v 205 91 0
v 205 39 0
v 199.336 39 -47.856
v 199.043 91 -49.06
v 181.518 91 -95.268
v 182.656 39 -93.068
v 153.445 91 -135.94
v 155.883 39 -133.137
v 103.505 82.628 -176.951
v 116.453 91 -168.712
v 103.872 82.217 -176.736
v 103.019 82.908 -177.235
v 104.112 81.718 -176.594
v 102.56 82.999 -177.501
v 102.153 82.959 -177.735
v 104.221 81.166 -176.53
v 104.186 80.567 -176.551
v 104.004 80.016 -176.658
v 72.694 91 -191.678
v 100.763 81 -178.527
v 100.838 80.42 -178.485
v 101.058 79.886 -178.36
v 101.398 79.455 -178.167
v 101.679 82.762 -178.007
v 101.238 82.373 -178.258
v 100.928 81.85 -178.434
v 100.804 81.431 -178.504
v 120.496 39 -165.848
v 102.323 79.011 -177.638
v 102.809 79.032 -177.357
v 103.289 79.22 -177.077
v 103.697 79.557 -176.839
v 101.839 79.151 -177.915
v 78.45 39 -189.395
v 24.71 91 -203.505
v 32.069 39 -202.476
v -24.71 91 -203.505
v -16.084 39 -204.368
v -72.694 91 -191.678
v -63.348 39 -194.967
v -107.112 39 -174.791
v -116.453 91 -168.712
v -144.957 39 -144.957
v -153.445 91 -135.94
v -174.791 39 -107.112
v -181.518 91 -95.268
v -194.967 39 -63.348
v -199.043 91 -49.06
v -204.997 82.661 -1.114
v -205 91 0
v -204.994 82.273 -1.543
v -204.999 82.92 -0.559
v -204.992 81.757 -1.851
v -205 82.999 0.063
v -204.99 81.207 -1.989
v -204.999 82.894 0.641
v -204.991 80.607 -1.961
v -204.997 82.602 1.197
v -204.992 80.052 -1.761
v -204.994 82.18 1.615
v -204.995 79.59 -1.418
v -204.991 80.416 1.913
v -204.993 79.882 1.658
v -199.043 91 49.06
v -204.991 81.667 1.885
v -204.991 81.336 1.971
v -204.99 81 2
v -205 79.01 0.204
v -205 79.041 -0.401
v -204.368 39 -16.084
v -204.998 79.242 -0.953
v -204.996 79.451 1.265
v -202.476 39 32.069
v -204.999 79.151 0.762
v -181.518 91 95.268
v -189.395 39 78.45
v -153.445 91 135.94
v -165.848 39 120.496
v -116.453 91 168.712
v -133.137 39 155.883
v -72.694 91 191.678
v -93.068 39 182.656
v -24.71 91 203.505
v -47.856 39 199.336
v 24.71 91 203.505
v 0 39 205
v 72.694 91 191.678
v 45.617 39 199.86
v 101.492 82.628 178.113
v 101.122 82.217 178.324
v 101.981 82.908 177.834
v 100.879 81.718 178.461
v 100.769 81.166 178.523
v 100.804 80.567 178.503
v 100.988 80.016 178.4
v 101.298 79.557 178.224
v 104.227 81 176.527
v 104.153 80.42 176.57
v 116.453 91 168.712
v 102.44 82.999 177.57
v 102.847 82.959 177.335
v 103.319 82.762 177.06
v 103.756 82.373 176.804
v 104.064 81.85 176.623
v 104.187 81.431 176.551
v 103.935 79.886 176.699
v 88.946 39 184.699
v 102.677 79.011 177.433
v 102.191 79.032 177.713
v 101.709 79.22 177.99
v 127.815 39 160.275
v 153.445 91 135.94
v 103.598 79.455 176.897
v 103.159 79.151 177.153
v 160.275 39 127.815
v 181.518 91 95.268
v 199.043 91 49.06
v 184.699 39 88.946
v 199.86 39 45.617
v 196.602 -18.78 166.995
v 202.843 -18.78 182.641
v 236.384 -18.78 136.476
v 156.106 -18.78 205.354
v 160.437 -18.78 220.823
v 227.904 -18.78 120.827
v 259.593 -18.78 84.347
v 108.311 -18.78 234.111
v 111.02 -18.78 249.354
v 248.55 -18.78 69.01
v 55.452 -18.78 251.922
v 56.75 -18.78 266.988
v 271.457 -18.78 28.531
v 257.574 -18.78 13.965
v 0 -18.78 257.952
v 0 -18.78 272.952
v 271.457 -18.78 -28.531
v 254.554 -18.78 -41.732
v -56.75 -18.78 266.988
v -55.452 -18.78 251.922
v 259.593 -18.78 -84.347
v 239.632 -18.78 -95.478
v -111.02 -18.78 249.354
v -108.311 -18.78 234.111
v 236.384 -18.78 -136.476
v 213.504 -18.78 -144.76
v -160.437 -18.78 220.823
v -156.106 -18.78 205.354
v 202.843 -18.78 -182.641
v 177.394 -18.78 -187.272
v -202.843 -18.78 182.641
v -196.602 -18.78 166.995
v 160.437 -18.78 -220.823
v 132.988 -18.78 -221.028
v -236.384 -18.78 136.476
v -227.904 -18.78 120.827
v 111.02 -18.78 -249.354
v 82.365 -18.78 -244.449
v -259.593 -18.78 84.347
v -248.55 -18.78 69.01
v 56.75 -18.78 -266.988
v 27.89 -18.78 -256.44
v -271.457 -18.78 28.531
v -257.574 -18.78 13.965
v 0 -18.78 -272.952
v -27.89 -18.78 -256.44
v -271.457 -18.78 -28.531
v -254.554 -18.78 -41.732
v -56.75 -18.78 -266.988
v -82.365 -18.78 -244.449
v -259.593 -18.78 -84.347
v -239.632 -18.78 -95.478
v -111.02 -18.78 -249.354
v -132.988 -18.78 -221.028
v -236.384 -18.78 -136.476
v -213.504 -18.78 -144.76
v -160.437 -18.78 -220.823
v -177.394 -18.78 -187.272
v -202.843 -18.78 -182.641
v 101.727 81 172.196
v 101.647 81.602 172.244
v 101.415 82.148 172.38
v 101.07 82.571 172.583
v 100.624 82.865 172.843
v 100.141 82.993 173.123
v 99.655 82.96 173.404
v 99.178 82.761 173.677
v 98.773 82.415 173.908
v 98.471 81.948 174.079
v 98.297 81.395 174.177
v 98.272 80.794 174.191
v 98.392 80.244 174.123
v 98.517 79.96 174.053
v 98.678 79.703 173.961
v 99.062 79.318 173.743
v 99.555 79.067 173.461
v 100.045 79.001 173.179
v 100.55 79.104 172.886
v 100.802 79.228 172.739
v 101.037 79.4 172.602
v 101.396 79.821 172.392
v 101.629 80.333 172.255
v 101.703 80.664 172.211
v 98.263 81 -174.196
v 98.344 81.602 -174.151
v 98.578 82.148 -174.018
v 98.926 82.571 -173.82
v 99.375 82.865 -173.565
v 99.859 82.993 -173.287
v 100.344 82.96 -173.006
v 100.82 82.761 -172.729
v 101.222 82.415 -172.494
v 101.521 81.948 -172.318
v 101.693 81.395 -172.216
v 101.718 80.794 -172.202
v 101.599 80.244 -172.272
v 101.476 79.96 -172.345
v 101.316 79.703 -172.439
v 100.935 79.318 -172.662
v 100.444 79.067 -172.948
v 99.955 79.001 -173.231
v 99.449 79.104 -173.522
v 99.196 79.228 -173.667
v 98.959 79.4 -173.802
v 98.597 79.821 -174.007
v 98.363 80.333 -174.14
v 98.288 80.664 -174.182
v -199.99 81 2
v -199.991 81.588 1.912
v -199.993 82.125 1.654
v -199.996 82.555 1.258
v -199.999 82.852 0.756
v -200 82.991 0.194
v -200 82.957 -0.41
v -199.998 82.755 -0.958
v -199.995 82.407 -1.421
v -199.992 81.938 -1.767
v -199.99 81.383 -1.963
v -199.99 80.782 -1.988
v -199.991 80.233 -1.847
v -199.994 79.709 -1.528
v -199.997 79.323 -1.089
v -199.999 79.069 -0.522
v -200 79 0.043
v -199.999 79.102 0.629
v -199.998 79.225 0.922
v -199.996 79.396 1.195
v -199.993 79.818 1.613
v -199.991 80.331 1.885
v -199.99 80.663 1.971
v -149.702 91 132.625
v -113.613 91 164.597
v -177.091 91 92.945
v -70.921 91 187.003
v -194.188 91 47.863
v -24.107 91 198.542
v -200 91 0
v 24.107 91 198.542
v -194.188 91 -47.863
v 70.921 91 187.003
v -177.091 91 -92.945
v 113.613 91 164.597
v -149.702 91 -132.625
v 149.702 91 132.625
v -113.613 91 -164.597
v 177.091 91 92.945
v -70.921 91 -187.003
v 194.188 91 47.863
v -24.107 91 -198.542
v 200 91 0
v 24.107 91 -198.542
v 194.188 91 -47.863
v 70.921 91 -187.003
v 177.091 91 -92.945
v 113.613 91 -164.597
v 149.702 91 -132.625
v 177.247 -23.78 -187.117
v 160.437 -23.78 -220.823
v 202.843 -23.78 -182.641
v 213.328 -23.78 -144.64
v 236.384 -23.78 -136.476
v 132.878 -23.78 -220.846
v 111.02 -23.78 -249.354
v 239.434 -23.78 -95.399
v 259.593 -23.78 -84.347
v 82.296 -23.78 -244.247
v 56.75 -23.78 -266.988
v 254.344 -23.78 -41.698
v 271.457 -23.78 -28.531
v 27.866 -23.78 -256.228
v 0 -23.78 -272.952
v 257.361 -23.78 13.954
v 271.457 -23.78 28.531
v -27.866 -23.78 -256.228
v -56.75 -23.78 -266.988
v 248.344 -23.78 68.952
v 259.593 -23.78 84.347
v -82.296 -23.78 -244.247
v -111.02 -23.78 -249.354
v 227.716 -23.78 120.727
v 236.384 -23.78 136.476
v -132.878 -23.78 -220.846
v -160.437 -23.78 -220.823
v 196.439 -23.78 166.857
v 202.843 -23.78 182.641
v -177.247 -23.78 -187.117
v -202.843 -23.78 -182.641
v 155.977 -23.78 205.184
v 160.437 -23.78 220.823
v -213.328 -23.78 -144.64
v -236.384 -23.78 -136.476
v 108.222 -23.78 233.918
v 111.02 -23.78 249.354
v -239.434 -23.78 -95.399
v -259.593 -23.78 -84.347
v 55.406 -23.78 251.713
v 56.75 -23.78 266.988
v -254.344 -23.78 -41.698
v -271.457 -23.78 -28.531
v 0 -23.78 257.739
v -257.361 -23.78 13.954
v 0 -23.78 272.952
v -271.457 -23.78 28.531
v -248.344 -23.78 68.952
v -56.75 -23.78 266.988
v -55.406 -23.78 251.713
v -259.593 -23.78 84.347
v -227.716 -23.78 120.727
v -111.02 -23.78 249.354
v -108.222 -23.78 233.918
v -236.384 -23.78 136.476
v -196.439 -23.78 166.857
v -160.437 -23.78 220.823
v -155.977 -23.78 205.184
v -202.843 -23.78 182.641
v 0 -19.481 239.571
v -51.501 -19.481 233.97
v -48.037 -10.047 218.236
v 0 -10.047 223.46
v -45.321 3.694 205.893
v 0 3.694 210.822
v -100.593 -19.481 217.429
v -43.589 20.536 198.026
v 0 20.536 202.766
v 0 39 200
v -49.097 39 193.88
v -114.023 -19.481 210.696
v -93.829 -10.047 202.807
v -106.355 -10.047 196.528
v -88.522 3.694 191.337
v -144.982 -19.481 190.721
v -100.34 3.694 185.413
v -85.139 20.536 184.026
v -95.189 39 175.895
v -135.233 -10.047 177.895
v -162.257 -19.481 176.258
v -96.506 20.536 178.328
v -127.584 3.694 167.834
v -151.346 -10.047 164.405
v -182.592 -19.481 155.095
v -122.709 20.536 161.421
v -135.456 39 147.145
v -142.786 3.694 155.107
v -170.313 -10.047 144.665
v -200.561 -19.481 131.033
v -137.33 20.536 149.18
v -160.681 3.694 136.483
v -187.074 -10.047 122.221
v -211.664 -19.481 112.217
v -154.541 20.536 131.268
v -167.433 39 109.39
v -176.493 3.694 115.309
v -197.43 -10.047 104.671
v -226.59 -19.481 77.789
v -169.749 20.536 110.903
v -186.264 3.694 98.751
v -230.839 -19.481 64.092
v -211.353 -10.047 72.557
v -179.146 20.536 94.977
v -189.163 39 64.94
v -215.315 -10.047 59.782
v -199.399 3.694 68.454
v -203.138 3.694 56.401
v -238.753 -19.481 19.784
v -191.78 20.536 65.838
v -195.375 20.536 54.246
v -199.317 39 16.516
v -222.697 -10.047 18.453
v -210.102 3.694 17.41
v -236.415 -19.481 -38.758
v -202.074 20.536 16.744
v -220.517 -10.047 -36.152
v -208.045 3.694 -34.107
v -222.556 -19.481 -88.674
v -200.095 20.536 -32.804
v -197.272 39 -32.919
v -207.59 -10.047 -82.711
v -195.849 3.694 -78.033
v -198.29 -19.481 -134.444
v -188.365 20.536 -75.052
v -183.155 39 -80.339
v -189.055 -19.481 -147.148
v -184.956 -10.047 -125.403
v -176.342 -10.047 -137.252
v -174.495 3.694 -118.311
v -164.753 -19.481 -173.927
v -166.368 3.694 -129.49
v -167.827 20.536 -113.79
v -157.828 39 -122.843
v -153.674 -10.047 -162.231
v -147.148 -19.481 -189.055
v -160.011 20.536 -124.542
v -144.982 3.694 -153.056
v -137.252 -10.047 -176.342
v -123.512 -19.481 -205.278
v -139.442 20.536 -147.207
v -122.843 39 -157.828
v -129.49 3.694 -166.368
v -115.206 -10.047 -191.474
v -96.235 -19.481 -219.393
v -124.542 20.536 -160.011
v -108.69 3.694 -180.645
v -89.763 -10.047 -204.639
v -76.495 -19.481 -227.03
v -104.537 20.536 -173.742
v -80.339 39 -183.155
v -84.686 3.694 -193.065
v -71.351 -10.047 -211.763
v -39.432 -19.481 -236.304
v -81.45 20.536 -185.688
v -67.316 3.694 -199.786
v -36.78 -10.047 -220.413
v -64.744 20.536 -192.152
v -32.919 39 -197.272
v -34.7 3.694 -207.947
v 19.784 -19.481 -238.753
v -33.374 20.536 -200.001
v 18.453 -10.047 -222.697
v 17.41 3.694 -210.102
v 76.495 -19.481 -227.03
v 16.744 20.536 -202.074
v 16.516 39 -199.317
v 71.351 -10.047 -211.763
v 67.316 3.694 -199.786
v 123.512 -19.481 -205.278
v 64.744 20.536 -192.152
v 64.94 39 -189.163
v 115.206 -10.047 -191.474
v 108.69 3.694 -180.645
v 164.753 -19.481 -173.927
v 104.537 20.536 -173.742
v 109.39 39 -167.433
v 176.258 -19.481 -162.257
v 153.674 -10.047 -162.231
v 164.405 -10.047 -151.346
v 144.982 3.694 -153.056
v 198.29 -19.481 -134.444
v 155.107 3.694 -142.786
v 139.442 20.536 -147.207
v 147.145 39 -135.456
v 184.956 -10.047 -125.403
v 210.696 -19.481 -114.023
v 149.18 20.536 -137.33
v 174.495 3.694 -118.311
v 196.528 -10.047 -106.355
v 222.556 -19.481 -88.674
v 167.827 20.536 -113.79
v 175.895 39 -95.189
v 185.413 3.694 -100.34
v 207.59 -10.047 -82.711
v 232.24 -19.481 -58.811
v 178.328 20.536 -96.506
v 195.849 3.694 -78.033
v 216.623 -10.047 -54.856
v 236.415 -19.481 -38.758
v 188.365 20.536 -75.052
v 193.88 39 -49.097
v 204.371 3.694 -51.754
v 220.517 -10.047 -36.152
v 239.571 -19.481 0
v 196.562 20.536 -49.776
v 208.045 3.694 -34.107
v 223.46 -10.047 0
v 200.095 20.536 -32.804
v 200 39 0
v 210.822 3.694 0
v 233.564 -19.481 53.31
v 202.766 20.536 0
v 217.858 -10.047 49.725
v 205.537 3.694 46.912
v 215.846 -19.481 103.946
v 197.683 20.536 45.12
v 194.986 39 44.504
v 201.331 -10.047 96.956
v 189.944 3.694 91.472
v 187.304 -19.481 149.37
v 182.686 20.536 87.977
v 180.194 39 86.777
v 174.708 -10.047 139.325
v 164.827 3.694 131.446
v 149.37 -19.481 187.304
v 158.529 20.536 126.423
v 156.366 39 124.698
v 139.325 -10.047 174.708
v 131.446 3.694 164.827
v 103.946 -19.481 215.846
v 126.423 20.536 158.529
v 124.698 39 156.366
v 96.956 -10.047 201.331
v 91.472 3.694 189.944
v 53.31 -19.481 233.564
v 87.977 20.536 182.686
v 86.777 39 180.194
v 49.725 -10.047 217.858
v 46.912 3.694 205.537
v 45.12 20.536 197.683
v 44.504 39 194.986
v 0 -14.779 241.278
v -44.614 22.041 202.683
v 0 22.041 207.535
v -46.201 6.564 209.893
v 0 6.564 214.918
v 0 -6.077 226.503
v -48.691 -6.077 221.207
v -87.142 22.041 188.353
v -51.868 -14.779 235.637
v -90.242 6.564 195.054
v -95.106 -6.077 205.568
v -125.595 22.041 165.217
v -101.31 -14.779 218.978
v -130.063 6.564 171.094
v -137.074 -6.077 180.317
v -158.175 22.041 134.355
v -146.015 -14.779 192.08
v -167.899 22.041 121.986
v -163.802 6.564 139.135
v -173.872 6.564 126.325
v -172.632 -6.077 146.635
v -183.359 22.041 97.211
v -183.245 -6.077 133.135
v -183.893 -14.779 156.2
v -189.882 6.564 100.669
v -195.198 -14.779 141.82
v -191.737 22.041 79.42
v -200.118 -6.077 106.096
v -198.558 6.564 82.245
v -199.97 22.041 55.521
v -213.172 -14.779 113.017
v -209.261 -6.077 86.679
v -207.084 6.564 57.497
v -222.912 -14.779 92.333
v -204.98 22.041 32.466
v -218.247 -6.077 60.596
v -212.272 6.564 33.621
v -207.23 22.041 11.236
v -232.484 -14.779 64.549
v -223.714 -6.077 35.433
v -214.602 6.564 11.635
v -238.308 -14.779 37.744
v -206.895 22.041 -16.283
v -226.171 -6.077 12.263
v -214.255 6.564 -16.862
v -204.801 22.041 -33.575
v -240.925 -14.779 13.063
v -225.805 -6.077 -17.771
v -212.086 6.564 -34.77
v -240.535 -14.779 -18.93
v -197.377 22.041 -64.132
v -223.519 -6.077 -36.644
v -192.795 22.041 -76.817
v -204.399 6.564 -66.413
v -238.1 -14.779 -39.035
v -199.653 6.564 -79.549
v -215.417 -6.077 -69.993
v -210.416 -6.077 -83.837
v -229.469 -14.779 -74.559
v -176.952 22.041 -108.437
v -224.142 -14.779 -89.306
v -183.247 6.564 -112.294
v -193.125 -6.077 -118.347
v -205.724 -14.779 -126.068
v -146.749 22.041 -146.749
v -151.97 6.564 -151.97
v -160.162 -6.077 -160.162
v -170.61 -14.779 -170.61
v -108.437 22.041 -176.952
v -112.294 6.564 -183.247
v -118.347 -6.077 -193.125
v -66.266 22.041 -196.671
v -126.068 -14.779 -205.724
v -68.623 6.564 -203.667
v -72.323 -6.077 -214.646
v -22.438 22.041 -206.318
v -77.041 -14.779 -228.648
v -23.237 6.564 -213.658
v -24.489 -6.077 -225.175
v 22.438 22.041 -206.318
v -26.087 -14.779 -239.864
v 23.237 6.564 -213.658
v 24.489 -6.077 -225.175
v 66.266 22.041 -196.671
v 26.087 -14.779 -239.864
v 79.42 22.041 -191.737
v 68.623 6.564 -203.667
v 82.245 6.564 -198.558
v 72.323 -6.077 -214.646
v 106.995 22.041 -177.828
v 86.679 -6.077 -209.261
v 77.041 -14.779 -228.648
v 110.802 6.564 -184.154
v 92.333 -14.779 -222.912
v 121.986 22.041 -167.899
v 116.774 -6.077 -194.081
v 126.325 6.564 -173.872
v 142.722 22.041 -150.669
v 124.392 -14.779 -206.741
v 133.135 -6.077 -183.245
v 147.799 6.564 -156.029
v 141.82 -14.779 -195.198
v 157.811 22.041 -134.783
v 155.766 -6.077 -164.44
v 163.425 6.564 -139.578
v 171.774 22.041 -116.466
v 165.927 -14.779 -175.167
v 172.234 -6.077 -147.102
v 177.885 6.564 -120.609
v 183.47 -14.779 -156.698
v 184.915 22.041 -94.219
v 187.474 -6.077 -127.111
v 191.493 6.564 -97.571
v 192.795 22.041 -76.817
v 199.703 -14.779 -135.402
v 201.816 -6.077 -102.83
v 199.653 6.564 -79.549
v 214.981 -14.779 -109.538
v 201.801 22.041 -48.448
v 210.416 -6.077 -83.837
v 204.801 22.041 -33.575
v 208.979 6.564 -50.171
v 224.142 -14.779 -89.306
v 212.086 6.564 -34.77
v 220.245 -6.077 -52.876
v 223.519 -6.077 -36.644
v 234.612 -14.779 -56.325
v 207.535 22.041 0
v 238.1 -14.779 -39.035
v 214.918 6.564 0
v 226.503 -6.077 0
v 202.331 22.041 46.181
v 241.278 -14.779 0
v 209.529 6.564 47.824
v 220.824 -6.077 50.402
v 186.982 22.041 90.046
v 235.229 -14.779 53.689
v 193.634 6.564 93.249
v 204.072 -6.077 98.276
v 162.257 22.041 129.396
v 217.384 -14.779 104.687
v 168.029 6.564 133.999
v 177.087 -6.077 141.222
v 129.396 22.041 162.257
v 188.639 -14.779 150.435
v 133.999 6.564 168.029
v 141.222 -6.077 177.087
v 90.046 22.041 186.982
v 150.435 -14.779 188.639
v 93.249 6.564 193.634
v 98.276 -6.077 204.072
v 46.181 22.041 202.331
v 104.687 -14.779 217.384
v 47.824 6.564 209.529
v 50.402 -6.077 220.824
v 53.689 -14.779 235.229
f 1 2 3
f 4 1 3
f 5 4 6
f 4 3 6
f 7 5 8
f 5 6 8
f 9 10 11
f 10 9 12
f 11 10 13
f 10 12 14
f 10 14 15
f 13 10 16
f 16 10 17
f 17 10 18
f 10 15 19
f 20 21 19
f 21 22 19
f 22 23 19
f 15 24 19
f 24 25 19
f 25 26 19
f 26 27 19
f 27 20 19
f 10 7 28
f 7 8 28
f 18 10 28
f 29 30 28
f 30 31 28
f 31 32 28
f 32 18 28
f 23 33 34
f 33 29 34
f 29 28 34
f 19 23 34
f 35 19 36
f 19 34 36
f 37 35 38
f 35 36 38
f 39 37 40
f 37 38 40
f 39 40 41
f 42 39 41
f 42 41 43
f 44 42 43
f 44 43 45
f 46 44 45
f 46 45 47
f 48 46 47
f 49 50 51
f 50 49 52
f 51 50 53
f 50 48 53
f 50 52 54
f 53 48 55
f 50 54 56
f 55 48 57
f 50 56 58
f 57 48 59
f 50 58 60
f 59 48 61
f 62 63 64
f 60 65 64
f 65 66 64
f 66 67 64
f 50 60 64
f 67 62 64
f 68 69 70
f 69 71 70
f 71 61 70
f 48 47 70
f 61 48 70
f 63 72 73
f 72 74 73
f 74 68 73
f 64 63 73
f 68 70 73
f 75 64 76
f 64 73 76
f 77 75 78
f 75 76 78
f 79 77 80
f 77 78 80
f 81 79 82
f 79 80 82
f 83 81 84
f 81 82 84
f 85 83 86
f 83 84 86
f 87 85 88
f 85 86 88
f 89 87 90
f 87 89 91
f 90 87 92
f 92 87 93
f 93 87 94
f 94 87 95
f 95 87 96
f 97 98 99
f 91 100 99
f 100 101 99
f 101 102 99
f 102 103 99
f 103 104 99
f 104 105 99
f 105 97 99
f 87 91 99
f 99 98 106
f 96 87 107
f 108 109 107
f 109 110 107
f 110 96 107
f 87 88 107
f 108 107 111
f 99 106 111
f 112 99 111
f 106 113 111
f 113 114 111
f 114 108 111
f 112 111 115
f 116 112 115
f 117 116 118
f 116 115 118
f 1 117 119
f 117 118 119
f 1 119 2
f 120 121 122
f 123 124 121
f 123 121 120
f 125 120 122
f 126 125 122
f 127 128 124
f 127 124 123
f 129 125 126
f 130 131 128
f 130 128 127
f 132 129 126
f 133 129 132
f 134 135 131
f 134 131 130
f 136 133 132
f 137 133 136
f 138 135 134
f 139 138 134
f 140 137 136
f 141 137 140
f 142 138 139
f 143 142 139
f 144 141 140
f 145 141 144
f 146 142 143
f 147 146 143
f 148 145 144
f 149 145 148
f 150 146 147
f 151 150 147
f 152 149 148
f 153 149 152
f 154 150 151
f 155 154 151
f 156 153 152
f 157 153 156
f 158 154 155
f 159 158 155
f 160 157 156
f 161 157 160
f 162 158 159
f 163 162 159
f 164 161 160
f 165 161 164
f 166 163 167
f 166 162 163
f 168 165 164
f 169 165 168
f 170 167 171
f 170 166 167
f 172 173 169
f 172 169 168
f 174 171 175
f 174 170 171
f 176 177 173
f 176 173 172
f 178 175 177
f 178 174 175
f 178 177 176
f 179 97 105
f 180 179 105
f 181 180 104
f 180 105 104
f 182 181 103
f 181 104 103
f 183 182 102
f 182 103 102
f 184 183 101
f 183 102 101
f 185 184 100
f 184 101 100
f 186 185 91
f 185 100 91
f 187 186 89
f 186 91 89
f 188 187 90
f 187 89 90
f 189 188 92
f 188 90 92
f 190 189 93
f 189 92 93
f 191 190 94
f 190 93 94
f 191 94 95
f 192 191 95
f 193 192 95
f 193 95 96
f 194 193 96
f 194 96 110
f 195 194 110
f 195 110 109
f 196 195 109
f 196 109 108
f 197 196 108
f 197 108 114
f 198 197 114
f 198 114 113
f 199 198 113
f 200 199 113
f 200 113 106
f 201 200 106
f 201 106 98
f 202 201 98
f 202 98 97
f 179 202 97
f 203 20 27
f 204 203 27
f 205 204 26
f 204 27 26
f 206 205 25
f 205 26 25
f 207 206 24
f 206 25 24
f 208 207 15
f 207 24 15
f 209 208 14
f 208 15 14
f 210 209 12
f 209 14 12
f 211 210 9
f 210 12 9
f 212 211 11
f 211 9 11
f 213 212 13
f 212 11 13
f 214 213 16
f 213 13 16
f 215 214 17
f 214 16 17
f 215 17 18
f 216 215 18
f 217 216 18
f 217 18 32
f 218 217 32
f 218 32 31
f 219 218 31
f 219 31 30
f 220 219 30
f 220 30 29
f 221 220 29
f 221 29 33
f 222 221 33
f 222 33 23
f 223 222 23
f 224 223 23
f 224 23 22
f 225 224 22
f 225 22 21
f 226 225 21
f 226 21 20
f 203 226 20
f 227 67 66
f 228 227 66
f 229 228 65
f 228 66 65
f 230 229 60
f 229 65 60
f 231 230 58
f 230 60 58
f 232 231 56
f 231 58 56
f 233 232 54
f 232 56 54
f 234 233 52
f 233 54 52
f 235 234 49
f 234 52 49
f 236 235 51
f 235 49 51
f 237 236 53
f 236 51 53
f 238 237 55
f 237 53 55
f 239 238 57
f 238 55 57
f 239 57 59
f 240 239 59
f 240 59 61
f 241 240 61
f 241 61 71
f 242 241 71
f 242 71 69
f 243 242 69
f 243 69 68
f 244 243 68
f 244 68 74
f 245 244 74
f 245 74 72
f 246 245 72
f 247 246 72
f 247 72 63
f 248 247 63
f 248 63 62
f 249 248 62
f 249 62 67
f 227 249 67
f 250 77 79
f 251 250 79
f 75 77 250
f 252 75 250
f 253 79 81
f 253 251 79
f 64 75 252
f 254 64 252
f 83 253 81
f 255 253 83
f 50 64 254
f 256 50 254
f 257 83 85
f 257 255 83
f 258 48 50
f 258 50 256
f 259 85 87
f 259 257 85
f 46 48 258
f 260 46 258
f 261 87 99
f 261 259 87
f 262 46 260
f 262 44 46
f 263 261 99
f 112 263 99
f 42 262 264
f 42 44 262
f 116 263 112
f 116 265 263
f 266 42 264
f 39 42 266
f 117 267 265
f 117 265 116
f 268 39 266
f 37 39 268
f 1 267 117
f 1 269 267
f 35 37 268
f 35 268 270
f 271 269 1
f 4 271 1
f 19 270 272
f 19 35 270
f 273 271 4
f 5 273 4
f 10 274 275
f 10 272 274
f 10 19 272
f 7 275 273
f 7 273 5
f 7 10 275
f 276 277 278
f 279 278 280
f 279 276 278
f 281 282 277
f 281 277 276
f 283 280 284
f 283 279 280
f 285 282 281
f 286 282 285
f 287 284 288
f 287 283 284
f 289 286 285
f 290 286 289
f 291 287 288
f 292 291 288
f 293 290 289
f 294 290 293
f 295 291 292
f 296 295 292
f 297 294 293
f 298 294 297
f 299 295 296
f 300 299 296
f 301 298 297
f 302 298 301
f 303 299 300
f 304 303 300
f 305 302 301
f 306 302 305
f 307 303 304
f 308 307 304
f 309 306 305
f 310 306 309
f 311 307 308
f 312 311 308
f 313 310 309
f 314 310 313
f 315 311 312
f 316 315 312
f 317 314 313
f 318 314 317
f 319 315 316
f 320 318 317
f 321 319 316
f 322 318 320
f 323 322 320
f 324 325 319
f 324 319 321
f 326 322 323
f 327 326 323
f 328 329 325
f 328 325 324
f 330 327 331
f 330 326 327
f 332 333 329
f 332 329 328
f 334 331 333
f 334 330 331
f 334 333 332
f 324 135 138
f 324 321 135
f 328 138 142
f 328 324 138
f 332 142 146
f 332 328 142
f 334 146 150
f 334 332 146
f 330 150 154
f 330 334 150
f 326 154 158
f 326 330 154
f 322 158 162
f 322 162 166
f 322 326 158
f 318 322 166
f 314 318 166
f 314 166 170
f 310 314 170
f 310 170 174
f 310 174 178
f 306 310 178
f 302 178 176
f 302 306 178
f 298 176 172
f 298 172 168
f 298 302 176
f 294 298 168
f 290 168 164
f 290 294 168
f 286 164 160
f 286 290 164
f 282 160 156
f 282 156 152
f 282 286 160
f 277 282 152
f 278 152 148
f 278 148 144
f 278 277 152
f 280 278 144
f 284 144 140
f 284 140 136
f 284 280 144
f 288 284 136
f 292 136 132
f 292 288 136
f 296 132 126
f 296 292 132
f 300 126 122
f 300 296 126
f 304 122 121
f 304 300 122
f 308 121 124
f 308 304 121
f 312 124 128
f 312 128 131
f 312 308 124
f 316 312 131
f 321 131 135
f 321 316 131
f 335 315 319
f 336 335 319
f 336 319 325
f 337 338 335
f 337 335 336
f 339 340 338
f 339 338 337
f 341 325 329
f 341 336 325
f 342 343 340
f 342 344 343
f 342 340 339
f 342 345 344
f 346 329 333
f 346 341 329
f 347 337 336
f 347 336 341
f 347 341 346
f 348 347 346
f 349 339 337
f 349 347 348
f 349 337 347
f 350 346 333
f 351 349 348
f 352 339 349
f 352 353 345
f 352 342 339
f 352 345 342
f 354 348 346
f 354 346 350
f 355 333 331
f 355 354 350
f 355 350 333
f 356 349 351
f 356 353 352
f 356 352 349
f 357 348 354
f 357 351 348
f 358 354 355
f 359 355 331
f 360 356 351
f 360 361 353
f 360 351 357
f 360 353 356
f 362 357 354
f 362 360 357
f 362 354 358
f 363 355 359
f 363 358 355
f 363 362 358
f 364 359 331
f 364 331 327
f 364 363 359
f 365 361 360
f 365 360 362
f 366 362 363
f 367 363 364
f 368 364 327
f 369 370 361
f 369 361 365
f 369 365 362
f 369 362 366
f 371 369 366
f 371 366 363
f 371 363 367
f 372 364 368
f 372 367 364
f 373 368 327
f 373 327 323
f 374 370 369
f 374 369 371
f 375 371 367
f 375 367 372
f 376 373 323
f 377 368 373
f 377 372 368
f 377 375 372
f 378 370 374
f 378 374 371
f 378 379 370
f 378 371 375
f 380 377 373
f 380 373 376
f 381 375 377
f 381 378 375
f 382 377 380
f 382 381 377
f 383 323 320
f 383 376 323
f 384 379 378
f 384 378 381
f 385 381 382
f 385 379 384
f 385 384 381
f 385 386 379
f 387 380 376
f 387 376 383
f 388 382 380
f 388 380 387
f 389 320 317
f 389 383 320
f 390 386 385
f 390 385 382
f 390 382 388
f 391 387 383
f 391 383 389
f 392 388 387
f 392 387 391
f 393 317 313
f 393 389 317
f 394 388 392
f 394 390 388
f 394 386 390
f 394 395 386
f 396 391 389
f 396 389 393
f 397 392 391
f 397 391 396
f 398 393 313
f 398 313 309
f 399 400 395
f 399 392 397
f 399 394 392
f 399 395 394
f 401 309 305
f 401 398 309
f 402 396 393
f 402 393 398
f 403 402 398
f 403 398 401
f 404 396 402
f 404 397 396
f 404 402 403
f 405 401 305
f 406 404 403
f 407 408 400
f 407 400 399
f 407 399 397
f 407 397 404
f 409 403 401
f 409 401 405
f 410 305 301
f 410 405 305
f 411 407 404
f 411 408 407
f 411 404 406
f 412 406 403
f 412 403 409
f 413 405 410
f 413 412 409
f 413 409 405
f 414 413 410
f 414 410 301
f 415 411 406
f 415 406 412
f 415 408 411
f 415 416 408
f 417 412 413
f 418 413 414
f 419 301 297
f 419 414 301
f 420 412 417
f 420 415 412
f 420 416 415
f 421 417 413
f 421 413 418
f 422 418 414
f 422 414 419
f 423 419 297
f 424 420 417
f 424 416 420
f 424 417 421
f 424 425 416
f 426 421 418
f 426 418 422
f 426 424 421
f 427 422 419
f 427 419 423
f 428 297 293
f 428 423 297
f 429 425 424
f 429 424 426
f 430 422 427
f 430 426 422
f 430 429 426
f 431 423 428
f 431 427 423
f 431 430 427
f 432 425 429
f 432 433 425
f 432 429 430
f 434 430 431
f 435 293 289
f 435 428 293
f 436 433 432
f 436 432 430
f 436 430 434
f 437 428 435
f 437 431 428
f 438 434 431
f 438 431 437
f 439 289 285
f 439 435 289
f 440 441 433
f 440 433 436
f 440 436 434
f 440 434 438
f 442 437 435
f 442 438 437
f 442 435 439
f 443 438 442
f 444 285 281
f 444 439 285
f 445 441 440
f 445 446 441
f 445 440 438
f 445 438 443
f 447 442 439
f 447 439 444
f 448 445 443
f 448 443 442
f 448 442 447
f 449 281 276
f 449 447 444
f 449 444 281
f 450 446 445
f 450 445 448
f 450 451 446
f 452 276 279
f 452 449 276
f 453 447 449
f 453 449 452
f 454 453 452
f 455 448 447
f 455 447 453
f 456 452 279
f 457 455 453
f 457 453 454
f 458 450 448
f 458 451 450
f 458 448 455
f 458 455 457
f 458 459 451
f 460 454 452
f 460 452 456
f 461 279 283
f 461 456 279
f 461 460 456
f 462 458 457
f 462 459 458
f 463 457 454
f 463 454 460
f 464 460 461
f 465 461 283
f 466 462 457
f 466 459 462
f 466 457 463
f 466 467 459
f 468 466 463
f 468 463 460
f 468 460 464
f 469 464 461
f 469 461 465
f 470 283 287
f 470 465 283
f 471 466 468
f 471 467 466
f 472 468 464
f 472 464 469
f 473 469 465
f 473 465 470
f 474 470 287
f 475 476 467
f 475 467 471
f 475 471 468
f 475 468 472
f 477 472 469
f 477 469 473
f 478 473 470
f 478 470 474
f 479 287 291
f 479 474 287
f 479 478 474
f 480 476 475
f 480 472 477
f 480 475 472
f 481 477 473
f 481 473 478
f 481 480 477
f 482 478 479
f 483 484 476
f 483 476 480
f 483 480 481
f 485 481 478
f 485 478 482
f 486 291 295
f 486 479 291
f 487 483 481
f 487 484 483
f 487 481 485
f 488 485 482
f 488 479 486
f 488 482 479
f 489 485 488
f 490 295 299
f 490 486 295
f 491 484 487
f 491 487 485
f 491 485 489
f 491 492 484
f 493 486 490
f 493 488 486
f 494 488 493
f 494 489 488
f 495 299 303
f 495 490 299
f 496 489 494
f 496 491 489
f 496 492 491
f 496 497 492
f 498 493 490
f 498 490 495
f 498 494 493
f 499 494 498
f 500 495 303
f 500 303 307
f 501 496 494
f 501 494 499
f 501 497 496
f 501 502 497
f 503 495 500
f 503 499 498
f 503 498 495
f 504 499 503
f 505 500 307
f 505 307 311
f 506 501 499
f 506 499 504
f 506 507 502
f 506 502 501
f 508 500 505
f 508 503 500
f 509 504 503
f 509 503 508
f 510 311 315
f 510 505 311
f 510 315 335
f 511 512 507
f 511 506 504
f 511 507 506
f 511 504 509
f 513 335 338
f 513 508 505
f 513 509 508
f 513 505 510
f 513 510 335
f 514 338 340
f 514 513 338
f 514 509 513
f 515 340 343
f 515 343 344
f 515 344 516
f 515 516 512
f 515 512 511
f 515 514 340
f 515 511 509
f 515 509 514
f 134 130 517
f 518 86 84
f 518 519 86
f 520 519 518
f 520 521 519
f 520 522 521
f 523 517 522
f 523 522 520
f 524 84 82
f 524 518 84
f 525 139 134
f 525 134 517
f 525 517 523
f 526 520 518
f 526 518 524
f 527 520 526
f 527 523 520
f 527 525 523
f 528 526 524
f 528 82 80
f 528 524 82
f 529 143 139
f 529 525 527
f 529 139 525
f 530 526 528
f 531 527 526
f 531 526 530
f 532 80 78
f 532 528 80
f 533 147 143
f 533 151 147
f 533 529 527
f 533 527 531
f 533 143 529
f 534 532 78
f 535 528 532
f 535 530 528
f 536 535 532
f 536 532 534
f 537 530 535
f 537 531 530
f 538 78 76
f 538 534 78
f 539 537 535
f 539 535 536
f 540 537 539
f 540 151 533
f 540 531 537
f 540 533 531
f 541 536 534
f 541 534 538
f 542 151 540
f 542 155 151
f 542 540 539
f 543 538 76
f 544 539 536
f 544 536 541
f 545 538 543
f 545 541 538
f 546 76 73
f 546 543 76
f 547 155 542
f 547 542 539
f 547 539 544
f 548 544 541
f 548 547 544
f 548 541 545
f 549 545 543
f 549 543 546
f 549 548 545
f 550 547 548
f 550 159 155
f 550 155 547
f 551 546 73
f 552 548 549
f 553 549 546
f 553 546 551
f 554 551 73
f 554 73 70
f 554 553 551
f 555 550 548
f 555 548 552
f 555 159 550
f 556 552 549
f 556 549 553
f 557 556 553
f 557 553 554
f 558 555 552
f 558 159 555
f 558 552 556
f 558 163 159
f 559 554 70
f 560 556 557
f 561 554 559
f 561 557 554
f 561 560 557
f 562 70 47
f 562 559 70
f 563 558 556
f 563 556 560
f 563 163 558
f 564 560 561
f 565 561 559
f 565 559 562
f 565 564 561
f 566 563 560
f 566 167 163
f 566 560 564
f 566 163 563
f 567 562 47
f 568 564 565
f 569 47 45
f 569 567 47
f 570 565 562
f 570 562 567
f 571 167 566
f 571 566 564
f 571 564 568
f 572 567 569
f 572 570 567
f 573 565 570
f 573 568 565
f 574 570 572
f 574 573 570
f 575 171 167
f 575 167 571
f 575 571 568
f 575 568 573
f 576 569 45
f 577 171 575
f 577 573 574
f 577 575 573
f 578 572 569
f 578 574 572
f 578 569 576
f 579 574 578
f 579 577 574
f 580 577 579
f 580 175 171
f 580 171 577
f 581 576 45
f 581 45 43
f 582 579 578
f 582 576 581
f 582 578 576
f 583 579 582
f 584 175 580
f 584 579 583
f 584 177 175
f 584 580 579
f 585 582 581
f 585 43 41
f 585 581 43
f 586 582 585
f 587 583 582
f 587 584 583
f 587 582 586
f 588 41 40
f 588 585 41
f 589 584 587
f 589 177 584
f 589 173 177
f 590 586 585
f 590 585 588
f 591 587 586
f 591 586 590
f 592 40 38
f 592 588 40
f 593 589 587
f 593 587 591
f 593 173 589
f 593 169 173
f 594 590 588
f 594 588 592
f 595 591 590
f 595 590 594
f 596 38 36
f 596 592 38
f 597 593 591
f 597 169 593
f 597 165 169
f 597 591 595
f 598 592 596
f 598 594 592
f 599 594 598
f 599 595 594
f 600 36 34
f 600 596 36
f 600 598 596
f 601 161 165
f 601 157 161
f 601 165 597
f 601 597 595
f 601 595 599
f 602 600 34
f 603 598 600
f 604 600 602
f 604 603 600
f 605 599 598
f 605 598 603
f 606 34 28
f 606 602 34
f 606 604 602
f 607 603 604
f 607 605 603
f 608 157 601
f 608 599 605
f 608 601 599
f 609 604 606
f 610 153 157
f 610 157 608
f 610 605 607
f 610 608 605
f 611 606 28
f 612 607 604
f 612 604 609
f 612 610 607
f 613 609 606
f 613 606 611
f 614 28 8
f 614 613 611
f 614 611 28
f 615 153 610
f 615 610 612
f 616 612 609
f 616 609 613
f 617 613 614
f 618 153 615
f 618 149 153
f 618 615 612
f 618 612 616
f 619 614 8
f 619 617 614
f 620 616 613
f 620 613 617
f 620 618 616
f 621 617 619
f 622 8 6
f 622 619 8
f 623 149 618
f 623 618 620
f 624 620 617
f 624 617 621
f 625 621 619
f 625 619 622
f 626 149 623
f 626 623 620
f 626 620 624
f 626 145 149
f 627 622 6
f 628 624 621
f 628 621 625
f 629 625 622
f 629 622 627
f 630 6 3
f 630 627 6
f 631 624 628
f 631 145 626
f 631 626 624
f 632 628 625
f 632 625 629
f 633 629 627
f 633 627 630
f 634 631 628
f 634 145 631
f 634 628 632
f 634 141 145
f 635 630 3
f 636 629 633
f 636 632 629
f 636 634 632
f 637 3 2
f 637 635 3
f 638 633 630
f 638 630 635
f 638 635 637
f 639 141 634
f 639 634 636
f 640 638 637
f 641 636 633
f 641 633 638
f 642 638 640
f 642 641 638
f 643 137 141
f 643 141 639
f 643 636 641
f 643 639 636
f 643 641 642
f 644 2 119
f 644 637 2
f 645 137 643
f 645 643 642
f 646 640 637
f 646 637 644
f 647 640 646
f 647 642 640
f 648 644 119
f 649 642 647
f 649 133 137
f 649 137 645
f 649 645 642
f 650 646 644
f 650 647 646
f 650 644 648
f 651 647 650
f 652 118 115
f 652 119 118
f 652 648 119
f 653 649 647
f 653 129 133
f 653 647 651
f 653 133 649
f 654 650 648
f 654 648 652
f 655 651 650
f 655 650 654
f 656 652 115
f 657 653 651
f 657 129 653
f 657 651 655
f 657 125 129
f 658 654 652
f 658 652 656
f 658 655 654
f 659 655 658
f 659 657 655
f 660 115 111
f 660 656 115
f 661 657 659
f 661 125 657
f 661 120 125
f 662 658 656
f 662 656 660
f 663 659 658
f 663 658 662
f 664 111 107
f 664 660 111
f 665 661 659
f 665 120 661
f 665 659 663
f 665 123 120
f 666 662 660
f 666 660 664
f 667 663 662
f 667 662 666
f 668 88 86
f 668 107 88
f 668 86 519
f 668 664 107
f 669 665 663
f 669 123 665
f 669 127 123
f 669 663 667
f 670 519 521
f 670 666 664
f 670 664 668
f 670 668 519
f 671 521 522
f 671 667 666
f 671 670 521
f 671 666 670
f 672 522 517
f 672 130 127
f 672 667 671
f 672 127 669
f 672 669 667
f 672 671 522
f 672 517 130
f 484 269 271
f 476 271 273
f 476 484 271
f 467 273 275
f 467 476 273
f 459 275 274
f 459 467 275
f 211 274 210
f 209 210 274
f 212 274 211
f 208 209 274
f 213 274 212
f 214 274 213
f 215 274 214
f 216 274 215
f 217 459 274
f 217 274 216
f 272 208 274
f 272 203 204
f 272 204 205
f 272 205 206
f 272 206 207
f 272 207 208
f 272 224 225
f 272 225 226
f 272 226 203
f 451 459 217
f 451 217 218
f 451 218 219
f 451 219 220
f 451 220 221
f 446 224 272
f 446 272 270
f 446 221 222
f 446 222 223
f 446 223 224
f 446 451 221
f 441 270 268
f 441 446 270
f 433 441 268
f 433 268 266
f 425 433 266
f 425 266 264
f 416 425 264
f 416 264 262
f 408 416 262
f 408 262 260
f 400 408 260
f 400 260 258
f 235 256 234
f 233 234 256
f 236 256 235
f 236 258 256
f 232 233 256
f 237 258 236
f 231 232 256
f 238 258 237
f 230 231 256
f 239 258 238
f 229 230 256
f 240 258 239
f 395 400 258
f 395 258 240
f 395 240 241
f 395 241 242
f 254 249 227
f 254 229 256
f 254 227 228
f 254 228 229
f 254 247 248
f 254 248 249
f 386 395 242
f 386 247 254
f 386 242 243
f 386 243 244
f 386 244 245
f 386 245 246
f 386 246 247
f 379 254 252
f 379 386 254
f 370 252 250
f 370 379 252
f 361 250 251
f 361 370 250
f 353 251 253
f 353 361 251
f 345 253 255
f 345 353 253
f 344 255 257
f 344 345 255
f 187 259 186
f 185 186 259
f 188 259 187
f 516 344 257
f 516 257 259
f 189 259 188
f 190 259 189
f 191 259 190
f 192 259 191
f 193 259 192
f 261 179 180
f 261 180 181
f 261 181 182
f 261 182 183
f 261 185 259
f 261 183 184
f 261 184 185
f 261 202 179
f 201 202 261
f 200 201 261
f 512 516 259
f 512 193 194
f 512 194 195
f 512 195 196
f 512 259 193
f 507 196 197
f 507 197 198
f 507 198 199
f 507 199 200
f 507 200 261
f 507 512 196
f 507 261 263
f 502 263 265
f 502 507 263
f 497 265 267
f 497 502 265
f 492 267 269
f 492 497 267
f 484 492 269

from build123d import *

# Parameters (mm, degrees)
LOFT_THIN1_START       = 39
LOFT_THIN1_OUTLINE_R   = 205
LOFT_THIN1_OUTLINE_R_2 = 200
LOFT_THIN1_DEPTH       = 52
SKETCH6_R              = 2
CUT_EXTRUDE1_DEPTH     = 10
CIRPATTERN1_COUNT      = 3


# Read off the part's stored shape, not the designer's step: Loft-Thin1
with BuildPart() as part:
    # Loft-Thin1 outline → Loft-Thin1 (new body)
    with BuildSketch(Plane(origin=(0, 0, 0), x_dir=(1, 0, 0), z_dir=(0, 1, 0)).offset(LOFT_THIN1_START)):
        Circle(LOFT_THIN1_OUTLINE_R)
        Circle(LOFT_THIN1_OUTLINE_R_2, mode=Mode.SUBTRACT)
    extrude(amount=LOFT_THIN1_DEPTH)

    # Sketch5 → Revolve-Thin2 (revolve)
    with BuildSketch(Plane.XY, mode=Mode.PRIVATE) as revolve_thin2_sk:
        with BuildLine():
            ThreePointArc((205, 39), (220.240453532, -0.187002767), (257.952454685, -18.779947095))
            Line((257.952454685, -18.779947095), (272.952454685, -18.779947095))
            Line((272.952454685, -18.779947095), (272.952454685, -23.779947095))
            Line((272.952454685, -23.779947095), (257.738988428, -23.779947095))
            ThreePointArc((257.738988428, -23.779947095), (216.629515158, -3.647135138), (200, 39))
            Line((200, 39), (205, 39))
        make_face()
    revolve(revolve_thin2_sk.sketch.rotate(Axis((0, 91, 0), (0, -1, 0)), 90), axis=Axis((0, 91, 0), (0, -1, 0)))

    # Sketch6 → Cut-Extrude1 (cut)
    with BuildSketch(Plane.ZY.offset(205)):
        with Locations((0, 81)):
            Circle(SKETCH6_R)
    cut_extrude1 = extrude(amount=-CUT_EXTRUDE1_DEPTH, mode=Mode.SUBTRACT)

    # CirPattern1: Cut-Extrude1 ×3 about axis
    cirpattern1_axis = Axis((0, 91, 0), (0, 1, 0))
    for i in range(1, CIRPATTERN1_COUNT):
        add(cut_extrude1.rotate(cirpattern1_axis, i * 360 / CIRPATTERN1_COUNT), mode=Mode.SUBTRACT)


solid = part.part
